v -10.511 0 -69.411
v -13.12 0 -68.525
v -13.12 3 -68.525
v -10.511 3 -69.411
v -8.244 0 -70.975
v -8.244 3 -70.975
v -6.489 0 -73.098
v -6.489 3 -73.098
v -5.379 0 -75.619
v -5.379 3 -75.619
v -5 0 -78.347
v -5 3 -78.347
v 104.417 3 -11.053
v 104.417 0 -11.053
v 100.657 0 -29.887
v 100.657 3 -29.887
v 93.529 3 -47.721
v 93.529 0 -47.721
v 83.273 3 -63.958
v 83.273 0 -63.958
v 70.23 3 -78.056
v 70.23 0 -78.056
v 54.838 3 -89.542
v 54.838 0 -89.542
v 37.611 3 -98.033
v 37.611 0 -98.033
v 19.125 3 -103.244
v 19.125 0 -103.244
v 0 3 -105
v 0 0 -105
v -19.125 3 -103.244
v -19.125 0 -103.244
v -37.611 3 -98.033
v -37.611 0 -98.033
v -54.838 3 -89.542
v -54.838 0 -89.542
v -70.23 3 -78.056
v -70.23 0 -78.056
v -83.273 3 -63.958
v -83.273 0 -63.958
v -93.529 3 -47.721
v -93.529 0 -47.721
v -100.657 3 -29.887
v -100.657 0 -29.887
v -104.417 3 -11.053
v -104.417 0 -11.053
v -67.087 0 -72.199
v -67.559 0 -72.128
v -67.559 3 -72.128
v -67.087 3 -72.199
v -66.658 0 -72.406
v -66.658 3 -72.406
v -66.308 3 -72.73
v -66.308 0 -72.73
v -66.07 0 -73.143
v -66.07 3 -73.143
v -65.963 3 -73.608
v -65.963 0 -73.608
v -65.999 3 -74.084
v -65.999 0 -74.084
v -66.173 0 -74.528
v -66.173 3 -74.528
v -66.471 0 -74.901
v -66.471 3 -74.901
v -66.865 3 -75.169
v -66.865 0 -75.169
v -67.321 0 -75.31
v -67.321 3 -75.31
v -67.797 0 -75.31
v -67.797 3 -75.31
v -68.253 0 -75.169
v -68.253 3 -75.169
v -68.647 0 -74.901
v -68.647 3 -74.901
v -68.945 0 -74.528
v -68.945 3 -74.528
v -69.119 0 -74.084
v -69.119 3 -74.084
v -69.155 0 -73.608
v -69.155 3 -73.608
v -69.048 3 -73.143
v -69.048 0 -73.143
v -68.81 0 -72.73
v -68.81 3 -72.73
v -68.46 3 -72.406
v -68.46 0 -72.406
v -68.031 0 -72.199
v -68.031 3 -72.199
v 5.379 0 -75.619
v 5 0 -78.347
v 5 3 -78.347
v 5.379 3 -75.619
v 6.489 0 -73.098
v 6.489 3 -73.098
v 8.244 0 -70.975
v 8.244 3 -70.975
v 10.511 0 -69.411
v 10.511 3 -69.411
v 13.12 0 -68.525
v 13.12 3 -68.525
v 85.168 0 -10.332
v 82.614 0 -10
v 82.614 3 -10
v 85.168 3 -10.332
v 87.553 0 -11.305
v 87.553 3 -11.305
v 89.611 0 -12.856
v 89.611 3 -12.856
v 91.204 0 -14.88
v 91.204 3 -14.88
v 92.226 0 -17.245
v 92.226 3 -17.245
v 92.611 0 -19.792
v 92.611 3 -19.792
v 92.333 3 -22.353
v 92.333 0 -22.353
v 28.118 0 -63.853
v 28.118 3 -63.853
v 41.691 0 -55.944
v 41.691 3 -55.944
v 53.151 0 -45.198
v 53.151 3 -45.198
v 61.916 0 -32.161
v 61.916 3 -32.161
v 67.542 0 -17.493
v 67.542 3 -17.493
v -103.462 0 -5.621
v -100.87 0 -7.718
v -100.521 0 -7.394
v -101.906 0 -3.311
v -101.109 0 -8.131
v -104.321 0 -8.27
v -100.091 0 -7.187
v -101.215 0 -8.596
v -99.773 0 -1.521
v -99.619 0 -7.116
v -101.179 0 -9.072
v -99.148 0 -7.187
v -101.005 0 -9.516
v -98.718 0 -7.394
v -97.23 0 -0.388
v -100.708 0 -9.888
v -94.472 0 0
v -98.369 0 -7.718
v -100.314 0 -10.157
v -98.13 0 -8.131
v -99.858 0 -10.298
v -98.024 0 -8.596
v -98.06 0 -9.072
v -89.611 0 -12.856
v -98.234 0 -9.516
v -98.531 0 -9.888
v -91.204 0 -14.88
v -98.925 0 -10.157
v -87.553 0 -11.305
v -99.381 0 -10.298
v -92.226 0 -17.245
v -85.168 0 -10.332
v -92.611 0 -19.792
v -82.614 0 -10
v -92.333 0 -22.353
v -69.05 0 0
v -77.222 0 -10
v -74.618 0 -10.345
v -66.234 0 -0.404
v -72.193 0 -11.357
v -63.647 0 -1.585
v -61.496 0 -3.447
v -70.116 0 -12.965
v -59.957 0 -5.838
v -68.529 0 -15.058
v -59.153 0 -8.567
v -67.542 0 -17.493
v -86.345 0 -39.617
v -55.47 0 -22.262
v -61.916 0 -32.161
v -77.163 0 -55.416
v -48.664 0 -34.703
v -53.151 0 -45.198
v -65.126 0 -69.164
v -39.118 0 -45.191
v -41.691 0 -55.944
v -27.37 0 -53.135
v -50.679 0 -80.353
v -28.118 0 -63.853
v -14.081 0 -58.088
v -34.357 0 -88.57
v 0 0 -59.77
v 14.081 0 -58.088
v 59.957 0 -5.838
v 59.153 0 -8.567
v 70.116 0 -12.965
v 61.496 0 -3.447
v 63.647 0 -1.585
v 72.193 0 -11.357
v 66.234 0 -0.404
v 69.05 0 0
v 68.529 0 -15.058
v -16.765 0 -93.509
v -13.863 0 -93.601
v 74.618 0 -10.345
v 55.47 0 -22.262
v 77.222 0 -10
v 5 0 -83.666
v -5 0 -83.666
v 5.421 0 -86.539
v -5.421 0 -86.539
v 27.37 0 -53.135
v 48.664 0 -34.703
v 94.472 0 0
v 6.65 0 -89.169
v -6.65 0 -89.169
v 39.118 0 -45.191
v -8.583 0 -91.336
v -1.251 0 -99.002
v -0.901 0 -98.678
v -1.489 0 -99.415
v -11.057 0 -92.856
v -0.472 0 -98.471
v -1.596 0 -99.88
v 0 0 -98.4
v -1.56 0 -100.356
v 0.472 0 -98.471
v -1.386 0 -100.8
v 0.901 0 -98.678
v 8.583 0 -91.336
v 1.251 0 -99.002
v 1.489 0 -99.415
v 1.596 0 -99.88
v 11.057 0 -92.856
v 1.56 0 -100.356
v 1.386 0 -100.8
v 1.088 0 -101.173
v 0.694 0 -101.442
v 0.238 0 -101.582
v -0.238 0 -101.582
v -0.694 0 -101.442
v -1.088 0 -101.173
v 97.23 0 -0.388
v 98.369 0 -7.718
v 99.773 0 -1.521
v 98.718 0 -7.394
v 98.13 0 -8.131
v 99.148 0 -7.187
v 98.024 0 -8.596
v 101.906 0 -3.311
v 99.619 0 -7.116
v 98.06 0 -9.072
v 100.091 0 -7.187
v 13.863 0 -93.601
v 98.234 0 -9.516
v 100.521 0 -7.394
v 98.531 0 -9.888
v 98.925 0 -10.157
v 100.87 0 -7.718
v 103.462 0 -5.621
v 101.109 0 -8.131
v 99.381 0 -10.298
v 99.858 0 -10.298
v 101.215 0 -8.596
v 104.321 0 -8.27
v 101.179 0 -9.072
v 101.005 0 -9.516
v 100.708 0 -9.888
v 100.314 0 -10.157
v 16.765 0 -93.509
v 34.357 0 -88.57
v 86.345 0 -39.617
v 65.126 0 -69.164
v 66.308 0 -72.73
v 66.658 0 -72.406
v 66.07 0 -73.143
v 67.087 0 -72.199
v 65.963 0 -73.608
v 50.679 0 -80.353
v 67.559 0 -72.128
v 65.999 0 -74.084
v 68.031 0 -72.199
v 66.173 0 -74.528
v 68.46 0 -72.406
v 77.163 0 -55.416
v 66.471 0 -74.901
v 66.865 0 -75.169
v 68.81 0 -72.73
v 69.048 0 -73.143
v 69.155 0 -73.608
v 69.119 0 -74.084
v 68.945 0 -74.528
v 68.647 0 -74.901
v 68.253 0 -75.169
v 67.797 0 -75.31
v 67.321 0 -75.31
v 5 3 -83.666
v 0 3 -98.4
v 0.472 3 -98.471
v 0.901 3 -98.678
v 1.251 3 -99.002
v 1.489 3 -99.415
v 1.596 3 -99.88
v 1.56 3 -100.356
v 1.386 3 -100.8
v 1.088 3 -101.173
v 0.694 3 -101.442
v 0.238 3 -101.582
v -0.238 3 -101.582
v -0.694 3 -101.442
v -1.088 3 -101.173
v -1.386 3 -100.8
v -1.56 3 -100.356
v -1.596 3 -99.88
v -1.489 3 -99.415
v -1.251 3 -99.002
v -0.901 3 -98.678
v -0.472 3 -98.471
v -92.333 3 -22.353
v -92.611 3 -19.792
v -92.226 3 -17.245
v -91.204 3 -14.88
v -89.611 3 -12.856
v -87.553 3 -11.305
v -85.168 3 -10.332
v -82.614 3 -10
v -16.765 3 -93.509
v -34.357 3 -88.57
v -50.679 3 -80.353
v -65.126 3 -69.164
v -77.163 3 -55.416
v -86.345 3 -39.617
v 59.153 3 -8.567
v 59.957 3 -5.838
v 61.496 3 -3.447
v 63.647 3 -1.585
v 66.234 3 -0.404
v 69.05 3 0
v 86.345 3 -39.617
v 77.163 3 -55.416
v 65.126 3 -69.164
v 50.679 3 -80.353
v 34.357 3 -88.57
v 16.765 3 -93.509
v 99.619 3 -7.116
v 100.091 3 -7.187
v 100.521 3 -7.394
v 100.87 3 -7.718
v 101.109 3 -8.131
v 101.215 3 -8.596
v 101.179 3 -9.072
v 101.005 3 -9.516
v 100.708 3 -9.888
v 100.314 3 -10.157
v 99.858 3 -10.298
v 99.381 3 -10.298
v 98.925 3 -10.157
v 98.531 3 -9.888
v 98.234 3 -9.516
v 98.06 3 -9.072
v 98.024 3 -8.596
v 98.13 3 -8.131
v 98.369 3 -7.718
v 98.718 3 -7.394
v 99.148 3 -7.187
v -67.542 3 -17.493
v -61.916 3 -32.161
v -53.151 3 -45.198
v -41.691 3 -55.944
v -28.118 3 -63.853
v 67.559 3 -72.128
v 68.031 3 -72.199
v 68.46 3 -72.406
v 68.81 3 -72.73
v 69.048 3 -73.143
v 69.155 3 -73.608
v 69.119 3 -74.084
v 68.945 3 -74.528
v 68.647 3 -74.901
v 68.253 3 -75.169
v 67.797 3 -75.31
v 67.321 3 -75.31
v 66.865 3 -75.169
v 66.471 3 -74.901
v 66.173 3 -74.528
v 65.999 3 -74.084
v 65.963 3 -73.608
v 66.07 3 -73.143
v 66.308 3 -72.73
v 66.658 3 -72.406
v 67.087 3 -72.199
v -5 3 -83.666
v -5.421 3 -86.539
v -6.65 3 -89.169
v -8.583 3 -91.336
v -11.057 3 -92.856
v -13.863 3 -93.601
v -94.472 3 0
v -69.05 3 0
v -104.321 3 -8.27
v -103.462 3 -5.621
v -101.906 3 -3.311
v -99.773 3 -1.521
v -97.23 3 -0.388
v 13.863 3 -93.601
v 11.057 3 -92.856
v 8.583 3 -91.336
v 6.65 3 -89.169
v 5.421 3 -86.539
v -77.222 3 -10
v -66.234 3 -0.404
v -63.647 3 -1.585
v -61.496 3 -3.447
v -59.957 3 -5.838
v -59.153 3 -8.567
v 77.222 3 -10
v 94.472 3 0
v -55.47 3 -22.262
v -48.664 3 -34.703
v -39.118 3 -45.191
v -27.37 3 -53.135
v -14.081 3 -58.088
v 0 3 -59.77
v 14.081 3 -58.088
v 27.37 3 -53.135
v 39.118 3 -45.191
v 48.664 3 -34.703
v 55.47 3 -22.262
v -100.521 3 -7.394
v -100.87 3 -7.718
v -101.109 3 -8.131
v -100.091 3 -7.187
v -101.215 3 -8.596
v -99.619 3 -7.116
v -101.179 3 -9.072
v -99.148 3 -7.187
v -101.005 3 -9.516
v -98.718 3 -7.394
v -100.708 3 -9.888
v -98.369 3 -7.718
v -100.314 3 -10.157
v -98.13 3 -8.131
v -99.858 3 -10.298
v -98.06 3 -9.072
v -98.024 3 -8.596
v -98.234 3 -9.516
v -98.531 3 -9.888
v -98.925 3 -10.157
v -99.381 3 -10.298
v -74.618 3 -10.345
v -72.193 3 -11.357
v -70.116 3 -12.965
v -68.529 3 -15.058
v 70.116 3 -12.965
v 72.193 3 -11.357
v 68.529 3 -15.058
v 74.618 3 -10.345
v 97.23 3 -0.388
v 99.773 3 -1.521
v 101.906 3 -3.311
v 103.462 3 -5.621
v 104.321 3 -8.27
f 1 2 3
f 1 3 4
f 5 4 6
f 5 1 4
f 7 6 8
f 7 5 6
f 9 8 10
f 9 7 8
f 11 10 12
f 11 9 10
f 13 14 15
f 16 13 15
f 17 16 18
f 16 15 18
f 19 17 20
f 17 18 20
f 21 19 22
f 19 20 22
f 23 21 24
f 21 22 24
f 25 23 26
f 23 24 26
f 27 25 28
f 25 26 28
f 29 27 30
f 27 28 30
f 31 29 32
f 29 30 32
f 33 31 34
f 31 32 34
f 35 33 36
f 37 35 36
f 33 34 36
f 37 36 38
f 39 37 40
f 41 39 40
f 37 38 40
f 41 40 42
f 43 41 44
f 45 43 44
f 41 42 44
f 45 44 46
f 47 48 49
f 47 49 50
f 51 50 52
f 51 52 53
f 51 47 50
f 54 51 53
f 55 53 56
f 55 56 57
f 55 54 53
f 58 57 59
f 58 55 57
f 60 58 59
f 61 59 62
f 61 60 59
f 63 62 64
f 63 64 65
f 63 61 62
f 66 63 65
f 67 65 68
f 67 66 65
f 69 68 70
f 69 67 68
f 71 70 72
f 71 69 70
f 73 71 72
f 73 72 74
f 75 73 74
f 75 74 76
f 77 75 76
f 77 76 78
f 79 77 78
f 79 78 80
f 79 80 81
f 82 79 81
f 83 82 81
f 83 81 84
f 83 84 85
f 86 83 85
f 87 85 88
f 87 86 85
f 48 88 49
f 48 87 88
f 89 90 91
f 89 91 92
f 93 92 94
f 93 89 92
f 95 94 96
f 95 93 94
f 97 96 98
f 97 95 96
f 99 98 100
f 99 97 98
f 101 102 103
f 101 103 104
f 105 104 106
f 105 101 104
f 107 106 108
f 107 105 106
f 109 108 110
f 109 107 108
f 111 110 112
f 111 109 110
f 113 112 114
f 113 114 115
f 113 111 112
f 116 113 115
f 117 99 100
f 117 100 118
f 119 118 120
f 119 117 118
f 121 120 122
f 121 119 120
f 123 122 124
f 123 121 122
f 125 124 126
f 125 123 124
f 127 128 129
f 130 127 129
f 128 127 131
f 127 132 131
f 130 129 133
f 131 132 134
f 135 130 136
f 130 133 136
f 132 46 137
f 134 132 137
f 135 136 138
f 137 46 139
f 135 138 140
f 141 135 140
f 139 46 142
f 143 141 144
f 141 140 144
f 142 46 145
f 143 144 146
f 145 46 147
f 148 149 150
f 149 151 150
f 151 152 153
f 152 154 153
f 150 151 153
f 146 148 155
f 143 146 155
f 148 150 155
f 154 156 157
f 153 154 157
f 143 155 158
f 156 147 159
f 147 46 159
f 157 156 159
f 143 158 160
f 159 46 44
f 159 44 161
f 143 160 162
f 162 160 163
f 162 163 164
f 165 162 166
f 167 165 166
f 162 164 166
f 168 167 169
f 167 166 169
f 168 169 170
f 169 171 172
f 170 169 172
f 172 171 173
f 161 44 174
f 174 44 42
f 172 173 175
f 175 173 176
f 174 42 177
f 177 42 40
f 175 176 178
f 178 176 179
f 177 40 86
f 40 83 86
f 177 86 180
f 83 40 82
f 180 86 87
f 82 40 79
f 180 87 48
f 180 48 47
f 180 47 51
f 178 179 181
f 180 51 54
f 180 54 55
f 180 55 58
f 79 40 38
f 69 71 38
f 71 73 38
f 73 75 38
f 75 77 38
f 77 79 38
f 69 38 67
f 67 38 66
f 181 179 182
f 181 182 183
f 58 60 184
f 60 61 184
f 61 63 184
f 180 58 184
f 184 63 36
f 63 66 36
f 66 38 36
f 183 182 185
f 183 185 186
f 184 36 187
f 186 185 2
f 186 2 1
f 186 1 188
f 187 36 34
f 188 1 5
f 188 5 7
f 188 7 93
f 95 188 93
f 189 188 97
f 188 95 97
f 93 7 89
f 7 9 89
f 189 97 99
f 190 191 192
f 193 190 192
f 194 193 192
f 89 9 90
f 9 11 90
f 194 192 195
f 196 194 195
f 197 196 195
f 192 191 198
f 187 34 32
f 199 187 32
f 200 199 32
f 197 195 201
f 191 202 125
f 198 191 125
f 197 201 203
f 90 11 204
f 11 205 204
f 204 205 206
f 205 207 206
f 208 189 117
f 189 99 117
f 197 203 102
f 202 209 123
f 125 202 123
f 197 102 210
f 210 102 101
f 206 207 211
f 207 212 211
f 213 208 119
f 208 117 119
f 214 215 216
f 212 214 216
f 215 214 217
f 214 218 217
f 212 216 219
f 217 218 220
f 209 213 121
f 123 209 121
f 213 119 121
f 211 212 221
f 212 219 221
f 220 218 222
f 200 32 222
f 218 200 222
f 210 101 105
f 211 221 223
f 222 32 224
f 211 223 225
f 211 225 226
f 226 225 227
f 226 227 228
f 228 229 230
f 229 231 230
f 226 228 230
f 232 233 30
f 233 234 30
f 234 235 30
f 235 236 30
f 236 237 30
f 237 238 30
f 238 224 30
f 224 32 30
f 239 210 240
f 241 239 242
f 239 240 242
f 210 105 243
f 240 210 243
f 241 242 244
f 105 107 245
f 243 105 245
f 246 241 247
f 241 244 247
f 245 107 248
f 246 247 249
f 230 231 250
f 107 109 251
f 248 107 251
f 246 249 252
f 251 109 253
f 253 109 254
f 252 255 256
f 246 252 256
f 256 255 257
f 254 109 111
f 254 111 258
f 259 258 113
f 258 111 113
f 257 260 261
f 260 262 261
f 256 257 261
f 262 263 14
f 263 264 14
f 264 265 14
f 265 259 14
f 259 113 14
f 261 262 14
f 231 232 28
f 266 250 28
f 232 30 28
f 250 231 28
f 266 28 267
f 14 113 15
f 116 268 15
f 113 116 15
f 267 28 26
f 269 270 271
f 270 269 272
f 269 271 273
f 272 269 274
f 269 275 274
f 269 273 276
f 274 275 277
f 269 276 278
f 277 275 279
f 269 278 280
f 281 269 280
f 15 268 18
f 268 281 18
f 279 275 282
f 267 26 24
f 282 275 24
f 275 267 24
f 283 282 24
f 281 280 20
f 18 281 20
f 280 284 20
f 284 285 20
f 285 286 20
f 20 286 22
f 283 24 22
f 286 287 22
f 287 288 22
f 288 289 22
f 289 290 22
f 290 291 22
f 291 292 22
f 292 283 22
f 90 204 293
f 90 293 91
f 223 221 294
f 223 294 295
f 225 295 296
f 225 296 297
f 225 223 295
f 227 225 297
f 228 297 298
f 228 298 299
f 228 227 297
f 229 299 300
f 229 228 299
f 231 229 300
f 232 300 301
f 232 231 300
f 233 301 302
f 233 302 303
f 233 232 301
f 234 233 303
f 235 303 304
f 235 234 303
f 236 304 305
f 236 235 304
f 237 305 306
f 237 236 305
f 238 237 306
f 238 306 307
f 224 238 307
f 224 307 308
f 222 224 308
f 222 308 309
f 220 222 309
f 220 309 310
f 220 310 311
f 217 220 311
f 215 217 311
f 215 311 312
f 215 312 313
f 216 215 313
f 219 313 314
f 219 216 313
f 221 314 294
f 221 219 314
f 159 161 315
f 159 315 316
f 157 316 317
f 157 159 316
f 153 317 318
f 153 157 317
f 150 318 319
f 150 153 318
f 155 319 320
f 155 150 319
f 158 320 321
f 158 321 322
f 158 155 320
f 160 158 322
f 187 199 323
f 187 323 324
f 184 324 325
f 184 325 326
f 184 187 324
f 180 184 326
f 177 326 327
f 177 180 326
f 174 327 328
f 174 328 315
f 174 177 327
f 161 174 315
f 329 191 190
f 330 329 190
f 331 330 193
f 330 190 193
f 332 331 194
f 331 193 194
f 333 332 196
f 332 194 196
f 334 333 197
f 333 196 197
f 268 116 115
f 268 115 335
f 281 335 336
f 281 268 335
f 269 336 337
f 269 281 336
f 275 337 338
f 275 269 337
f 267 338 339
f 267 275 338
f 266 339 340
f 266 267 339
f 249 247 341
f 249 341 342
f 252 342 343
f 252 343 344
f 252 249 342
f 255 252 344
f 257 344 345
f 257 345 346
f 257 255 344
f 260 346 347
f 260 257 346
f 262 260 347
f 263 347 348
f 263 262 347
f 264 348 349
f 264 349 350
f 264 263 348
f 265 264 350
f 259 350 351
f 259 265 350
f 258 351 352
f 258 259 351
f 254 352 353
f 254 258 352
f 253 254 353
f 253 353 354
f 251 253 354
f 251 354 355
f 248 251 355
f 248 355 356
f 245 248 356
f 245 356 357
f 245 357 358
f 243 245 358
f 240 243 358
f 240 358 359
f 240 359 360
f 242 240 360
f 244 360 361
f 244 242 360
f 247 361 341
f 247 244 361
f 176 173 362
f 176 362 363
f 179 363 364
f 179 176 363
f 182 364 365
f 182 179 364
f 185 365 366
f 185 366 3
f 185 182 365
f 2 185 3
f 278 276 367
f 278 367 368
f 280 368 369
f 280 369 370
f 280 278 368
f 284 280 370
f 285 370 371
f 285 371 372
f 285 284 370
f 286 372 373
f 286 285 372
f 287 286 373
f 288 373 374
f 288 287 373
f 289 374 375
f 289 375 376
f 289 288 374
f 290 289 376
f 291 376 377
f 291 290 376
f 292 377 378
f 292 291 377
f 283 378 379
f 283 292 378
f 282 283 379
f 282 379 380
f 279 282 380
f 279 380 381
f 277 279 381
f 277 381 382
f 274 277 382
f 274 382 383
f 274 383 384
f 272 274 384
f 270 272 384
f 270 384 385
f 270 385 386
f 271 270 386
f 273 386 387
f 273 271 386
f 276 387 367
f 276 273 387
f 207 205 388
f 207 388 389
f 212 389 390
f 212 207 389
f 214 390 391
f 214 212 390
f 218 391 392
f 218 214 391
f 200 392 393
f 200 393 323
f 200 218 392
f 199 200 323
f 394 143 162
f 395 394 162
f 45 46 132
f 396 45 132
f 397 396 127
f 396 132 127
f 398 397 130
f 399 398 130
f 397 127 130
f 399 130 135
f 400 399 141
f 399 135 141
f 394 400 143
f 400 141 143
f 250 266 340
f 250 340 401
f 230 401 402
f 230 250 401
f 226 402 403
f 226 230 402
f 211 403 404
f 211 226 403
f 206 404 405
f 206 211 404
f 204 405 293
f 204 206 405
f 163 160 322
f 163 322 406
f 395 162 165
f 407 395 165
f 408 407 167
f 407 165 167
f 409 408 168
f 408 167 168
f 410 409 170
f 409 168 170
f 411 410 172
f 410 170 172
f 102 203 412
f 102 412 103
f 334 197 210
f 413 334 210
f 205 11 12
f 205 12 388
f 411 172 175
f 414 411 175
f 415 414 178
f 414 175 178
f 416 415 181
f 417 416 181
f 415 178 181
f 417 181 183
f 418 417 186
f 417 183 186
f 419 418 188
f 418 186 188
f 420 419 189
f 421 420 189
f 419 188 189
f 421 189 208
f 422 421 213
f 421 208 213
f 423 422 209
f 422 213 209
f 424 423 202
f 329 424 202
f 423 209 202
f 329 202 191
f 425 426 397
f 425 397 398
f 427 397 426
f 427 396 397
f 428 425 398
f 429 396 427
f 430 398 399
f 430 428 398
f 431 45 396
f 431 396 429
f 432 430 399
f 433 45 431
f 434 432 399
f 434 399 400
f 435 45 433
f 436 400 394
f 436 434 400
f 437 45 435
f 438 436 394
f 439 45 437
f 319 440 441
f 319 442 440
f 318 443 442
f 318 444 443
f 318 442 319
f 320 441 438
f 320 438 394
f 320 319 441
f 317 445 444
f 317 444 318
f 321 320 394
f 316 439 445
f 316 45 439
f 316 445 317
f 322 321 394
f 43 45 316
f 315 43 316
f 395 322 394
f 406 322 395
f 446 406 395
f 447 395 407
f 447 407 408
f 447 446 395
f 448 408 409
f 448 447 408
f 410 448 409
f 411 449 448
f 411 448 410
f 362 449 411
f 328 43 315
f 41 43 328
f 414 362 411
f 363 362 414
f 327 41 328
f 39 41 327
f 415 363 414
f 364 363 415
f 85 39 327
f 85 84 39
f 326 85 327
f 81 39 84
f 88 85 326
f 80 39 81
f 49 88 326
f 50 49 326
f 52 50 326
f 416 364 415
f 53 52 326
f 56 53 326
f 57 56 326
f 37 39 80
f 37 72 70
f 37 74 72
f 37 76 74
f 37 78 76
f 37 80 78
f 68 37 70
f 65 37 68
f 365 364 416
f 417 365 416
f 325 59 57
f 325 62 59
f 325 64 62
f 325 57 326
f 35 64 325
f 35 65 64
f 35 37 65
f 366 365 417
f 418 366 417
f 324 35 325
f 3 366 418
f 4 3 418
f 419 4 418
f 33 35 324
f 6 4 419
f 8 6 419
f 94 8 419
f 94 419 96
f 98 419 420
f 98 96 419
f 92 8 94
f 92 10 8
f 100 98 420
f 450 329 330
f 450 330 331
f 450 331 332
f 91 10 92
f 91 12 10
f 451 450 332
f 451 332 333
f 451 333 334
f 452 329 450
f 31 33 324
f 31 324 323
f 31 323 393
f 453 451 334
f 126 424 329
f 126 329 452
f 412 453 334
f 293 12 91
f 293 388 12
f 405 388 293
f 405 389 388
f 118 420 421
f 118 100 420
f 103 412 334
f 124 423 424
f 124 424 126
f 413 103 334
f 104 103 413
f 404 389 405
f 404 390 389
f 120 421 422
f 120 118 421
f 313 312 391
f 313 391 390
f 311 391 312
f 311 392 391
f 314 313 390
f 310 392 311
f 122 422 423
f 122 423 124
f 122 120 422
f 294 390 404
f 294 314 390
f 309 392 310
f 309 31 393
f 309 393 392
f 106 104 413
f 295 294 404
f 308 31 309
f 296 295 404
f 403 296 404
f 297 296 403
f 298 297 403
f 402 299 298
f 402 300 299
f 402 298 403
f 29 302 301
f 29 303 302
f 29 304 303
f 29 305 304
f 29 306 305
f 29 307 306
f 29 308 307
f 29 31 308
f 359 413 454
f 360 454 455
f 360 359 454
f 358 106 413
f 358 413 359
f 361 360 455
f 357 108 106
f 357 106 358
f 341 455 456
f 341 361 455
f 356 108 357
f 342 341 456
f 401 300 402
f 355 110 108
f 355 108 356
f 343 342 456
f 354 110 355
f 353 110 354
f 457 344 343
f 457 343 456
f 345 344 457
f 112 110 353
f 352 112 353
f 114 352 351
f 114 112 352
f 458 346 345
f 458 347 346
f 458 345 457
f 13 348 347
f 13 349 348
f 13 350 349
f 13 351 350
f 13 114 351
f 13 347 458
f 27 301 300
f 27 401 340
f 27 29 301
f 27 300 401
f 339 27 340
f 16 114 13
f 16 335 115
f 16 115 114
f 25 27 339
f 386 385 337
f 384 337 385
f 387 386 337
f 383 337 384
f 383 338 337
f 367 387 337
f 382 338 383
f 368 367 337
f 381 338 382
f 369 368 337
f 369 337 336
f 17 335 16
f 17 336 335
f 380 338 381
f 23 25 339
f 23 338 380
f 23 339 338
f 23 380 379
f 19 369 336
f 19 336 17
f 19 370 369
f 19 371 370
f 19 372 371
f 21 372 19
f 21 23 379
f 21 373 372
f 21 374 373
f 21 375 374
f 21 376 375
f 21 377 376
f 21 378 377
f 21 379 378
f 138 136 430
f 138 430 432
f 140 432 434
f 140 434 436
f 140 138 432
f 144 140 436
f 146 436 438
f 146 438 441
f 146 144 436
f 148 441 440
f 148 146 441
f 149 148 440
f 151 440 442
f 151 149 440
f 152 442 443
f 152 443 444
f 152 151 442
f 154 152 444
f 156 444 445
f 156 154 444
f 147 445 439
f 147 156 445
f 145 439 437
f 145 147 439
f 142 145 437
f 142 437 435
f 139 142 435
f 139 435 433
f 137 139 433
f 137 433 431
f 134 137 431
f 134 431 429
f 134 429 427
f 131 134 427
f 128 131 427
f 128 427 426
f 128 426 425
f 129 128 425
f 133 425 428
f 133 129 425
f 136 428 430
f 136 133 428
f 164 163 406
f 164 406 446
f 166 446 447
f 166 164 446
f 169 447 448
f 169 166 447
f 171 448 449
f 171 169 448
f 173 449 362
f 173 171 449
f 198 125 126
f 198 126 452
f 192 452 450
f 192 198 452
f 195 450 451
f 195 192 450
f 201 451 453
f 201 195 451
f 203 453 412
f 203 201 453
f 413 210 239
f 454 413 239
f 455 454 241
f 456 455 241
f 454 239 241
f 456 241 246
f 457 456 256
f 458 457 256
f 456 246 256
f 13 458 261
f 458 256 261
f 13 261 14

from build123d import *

# Parameters (mm, degrees)
SKETCH_2_R      = 1.6
EXTRUDE_1_DEPTH = 3


with BuildPart() as part:
    # 草图2 → 凸台-拉伸1 (new body)
    with BuildSketch(Plane(origin=(0, 0, 0), x_dir=(1, 0, 0), z_dir=(0, 1, 0))):
        with BuildLine():
            Line((-94.472218138, 0), (-69.049640839, 0))
            ThreePointArc((-69.049640839, 0), (-62.504902792, 2.439153229), (-59.152888533, 8.56671922))
            ThreePointArc((-59.152888533, 8.56671922), (0, 59.77), (59.152888533, 8.56671922))
            ThreePointArc((59.152888533, 8.56671922), (62.504902792, 2.439153229), (69.049640839, 0))
            Line((69.049640839, 0), (94.472218138, 0))
            ThreePointArc((94.472218138, 0), (101.906137555, 3.311439459), (104.416662153, 11.052631579))
            ThreePointArc((104.416662153, 11.052631579), (0, 105), (-104.416662153, 11.052631579))
            ThreePointArc((-104.416662153, 11.052631579), (-101.906137555, 3.311439459), (-94.472218138, 0))
        make_face()
        with Locations(Location((0, 100, 0), (0, 0, 270))):
            Circle(SKETCH_2_R, mode=Mode.SUBTRACT)
        with Locations(Location((67.559020762, 73.727733681, 0), (0, 0, 270))):
            Circle(SKETCH_2_R, mode=Mode.SUBTRACT)
        with Locations(Location((99.619469809, 8.715574275, 0), (0, 0, 270))):
            Circle(SKETCH_2_R, mode=Mode.SUBTRACT)
        with Locations(Location((-67.559020762, 73.727733681, 0), (0, 0, 270))):
            Circle(SKETCH_2_R, mode=Mode.SUBTRACT)
        with Locations(Location((-99.619469809, 8.715574275, 0), (0, 0, 270))):
            Circle(SKETCH_2_R, mode=Mode.SUBTRACT)
        with BuildLine():
            Line((-82.613558209, 10), (-77.222101111, 10))
            ThreePointArc((-77.222101111, 10), (-71.101320206, 12.092026738), (-67.541506763, 17.492791776))
            ThreePointArc((-67.541506763, 17.492791776), (-47.72457253, 50.894185099), (-13.119593832, 68.525390606))
            ThreePointArc((-13.119593832, 68.525390606), (-7.292728703, 71.975349568), (-5, 78.347003133))
            Line((-5, 78.347003133), (-5, 83.666002653))
            ThreePointArc((-5, 83.666002653), (-8.583110521, 91.335652542), (-16.764705882, 93.509061789))
            ThreePointArc((-16.764705882, 93.509061789), (-65.125761737, 69.163828395), (-92.332800352, 22.352941176))
            ThreePointArc((-92.332800352, 22.352941176), (-90.472610689, 13.816530576), (-82.613558209, 10))
        make_face(mode=Mode.SUBTRACT)
        with BuildLine():
            Line((77.222101111, 10), (82.613558209, 10))
            ThreePointArc((82.613558209, 10), (90.472610689, 13.816530576), (92.332800352, 22.352941176))
            ThreePointArc((92.332800352, 22.352941176), (65.125761737, 69.163828395), (16.764705882, 93.509061789))
            ThreePointArc((16.764705882, 93.509061789), (8.583110521, 91.335652542), (5, 83.666002653))
            Line((5, 83.666002653), (5, 78.347003133))
            ThreePointArc((5, 78.347003133), (7.292728703, 71.975349568), (13.119593832, 68.525390606))
            ThreePointArc((13.119593832, 68.525390606), (47.72457253, 50.894185099), (67.541506763, 17.492791776))
            ThreePointArc((67.541506763, 17.492791776), (71.101320206, 12.092026738), (77.222101111, 10))
        make_face(mode=Mode.SUBTRACT)
    extrude(amount=EXTRUDE_1_DEPTH)


solid = part.part
